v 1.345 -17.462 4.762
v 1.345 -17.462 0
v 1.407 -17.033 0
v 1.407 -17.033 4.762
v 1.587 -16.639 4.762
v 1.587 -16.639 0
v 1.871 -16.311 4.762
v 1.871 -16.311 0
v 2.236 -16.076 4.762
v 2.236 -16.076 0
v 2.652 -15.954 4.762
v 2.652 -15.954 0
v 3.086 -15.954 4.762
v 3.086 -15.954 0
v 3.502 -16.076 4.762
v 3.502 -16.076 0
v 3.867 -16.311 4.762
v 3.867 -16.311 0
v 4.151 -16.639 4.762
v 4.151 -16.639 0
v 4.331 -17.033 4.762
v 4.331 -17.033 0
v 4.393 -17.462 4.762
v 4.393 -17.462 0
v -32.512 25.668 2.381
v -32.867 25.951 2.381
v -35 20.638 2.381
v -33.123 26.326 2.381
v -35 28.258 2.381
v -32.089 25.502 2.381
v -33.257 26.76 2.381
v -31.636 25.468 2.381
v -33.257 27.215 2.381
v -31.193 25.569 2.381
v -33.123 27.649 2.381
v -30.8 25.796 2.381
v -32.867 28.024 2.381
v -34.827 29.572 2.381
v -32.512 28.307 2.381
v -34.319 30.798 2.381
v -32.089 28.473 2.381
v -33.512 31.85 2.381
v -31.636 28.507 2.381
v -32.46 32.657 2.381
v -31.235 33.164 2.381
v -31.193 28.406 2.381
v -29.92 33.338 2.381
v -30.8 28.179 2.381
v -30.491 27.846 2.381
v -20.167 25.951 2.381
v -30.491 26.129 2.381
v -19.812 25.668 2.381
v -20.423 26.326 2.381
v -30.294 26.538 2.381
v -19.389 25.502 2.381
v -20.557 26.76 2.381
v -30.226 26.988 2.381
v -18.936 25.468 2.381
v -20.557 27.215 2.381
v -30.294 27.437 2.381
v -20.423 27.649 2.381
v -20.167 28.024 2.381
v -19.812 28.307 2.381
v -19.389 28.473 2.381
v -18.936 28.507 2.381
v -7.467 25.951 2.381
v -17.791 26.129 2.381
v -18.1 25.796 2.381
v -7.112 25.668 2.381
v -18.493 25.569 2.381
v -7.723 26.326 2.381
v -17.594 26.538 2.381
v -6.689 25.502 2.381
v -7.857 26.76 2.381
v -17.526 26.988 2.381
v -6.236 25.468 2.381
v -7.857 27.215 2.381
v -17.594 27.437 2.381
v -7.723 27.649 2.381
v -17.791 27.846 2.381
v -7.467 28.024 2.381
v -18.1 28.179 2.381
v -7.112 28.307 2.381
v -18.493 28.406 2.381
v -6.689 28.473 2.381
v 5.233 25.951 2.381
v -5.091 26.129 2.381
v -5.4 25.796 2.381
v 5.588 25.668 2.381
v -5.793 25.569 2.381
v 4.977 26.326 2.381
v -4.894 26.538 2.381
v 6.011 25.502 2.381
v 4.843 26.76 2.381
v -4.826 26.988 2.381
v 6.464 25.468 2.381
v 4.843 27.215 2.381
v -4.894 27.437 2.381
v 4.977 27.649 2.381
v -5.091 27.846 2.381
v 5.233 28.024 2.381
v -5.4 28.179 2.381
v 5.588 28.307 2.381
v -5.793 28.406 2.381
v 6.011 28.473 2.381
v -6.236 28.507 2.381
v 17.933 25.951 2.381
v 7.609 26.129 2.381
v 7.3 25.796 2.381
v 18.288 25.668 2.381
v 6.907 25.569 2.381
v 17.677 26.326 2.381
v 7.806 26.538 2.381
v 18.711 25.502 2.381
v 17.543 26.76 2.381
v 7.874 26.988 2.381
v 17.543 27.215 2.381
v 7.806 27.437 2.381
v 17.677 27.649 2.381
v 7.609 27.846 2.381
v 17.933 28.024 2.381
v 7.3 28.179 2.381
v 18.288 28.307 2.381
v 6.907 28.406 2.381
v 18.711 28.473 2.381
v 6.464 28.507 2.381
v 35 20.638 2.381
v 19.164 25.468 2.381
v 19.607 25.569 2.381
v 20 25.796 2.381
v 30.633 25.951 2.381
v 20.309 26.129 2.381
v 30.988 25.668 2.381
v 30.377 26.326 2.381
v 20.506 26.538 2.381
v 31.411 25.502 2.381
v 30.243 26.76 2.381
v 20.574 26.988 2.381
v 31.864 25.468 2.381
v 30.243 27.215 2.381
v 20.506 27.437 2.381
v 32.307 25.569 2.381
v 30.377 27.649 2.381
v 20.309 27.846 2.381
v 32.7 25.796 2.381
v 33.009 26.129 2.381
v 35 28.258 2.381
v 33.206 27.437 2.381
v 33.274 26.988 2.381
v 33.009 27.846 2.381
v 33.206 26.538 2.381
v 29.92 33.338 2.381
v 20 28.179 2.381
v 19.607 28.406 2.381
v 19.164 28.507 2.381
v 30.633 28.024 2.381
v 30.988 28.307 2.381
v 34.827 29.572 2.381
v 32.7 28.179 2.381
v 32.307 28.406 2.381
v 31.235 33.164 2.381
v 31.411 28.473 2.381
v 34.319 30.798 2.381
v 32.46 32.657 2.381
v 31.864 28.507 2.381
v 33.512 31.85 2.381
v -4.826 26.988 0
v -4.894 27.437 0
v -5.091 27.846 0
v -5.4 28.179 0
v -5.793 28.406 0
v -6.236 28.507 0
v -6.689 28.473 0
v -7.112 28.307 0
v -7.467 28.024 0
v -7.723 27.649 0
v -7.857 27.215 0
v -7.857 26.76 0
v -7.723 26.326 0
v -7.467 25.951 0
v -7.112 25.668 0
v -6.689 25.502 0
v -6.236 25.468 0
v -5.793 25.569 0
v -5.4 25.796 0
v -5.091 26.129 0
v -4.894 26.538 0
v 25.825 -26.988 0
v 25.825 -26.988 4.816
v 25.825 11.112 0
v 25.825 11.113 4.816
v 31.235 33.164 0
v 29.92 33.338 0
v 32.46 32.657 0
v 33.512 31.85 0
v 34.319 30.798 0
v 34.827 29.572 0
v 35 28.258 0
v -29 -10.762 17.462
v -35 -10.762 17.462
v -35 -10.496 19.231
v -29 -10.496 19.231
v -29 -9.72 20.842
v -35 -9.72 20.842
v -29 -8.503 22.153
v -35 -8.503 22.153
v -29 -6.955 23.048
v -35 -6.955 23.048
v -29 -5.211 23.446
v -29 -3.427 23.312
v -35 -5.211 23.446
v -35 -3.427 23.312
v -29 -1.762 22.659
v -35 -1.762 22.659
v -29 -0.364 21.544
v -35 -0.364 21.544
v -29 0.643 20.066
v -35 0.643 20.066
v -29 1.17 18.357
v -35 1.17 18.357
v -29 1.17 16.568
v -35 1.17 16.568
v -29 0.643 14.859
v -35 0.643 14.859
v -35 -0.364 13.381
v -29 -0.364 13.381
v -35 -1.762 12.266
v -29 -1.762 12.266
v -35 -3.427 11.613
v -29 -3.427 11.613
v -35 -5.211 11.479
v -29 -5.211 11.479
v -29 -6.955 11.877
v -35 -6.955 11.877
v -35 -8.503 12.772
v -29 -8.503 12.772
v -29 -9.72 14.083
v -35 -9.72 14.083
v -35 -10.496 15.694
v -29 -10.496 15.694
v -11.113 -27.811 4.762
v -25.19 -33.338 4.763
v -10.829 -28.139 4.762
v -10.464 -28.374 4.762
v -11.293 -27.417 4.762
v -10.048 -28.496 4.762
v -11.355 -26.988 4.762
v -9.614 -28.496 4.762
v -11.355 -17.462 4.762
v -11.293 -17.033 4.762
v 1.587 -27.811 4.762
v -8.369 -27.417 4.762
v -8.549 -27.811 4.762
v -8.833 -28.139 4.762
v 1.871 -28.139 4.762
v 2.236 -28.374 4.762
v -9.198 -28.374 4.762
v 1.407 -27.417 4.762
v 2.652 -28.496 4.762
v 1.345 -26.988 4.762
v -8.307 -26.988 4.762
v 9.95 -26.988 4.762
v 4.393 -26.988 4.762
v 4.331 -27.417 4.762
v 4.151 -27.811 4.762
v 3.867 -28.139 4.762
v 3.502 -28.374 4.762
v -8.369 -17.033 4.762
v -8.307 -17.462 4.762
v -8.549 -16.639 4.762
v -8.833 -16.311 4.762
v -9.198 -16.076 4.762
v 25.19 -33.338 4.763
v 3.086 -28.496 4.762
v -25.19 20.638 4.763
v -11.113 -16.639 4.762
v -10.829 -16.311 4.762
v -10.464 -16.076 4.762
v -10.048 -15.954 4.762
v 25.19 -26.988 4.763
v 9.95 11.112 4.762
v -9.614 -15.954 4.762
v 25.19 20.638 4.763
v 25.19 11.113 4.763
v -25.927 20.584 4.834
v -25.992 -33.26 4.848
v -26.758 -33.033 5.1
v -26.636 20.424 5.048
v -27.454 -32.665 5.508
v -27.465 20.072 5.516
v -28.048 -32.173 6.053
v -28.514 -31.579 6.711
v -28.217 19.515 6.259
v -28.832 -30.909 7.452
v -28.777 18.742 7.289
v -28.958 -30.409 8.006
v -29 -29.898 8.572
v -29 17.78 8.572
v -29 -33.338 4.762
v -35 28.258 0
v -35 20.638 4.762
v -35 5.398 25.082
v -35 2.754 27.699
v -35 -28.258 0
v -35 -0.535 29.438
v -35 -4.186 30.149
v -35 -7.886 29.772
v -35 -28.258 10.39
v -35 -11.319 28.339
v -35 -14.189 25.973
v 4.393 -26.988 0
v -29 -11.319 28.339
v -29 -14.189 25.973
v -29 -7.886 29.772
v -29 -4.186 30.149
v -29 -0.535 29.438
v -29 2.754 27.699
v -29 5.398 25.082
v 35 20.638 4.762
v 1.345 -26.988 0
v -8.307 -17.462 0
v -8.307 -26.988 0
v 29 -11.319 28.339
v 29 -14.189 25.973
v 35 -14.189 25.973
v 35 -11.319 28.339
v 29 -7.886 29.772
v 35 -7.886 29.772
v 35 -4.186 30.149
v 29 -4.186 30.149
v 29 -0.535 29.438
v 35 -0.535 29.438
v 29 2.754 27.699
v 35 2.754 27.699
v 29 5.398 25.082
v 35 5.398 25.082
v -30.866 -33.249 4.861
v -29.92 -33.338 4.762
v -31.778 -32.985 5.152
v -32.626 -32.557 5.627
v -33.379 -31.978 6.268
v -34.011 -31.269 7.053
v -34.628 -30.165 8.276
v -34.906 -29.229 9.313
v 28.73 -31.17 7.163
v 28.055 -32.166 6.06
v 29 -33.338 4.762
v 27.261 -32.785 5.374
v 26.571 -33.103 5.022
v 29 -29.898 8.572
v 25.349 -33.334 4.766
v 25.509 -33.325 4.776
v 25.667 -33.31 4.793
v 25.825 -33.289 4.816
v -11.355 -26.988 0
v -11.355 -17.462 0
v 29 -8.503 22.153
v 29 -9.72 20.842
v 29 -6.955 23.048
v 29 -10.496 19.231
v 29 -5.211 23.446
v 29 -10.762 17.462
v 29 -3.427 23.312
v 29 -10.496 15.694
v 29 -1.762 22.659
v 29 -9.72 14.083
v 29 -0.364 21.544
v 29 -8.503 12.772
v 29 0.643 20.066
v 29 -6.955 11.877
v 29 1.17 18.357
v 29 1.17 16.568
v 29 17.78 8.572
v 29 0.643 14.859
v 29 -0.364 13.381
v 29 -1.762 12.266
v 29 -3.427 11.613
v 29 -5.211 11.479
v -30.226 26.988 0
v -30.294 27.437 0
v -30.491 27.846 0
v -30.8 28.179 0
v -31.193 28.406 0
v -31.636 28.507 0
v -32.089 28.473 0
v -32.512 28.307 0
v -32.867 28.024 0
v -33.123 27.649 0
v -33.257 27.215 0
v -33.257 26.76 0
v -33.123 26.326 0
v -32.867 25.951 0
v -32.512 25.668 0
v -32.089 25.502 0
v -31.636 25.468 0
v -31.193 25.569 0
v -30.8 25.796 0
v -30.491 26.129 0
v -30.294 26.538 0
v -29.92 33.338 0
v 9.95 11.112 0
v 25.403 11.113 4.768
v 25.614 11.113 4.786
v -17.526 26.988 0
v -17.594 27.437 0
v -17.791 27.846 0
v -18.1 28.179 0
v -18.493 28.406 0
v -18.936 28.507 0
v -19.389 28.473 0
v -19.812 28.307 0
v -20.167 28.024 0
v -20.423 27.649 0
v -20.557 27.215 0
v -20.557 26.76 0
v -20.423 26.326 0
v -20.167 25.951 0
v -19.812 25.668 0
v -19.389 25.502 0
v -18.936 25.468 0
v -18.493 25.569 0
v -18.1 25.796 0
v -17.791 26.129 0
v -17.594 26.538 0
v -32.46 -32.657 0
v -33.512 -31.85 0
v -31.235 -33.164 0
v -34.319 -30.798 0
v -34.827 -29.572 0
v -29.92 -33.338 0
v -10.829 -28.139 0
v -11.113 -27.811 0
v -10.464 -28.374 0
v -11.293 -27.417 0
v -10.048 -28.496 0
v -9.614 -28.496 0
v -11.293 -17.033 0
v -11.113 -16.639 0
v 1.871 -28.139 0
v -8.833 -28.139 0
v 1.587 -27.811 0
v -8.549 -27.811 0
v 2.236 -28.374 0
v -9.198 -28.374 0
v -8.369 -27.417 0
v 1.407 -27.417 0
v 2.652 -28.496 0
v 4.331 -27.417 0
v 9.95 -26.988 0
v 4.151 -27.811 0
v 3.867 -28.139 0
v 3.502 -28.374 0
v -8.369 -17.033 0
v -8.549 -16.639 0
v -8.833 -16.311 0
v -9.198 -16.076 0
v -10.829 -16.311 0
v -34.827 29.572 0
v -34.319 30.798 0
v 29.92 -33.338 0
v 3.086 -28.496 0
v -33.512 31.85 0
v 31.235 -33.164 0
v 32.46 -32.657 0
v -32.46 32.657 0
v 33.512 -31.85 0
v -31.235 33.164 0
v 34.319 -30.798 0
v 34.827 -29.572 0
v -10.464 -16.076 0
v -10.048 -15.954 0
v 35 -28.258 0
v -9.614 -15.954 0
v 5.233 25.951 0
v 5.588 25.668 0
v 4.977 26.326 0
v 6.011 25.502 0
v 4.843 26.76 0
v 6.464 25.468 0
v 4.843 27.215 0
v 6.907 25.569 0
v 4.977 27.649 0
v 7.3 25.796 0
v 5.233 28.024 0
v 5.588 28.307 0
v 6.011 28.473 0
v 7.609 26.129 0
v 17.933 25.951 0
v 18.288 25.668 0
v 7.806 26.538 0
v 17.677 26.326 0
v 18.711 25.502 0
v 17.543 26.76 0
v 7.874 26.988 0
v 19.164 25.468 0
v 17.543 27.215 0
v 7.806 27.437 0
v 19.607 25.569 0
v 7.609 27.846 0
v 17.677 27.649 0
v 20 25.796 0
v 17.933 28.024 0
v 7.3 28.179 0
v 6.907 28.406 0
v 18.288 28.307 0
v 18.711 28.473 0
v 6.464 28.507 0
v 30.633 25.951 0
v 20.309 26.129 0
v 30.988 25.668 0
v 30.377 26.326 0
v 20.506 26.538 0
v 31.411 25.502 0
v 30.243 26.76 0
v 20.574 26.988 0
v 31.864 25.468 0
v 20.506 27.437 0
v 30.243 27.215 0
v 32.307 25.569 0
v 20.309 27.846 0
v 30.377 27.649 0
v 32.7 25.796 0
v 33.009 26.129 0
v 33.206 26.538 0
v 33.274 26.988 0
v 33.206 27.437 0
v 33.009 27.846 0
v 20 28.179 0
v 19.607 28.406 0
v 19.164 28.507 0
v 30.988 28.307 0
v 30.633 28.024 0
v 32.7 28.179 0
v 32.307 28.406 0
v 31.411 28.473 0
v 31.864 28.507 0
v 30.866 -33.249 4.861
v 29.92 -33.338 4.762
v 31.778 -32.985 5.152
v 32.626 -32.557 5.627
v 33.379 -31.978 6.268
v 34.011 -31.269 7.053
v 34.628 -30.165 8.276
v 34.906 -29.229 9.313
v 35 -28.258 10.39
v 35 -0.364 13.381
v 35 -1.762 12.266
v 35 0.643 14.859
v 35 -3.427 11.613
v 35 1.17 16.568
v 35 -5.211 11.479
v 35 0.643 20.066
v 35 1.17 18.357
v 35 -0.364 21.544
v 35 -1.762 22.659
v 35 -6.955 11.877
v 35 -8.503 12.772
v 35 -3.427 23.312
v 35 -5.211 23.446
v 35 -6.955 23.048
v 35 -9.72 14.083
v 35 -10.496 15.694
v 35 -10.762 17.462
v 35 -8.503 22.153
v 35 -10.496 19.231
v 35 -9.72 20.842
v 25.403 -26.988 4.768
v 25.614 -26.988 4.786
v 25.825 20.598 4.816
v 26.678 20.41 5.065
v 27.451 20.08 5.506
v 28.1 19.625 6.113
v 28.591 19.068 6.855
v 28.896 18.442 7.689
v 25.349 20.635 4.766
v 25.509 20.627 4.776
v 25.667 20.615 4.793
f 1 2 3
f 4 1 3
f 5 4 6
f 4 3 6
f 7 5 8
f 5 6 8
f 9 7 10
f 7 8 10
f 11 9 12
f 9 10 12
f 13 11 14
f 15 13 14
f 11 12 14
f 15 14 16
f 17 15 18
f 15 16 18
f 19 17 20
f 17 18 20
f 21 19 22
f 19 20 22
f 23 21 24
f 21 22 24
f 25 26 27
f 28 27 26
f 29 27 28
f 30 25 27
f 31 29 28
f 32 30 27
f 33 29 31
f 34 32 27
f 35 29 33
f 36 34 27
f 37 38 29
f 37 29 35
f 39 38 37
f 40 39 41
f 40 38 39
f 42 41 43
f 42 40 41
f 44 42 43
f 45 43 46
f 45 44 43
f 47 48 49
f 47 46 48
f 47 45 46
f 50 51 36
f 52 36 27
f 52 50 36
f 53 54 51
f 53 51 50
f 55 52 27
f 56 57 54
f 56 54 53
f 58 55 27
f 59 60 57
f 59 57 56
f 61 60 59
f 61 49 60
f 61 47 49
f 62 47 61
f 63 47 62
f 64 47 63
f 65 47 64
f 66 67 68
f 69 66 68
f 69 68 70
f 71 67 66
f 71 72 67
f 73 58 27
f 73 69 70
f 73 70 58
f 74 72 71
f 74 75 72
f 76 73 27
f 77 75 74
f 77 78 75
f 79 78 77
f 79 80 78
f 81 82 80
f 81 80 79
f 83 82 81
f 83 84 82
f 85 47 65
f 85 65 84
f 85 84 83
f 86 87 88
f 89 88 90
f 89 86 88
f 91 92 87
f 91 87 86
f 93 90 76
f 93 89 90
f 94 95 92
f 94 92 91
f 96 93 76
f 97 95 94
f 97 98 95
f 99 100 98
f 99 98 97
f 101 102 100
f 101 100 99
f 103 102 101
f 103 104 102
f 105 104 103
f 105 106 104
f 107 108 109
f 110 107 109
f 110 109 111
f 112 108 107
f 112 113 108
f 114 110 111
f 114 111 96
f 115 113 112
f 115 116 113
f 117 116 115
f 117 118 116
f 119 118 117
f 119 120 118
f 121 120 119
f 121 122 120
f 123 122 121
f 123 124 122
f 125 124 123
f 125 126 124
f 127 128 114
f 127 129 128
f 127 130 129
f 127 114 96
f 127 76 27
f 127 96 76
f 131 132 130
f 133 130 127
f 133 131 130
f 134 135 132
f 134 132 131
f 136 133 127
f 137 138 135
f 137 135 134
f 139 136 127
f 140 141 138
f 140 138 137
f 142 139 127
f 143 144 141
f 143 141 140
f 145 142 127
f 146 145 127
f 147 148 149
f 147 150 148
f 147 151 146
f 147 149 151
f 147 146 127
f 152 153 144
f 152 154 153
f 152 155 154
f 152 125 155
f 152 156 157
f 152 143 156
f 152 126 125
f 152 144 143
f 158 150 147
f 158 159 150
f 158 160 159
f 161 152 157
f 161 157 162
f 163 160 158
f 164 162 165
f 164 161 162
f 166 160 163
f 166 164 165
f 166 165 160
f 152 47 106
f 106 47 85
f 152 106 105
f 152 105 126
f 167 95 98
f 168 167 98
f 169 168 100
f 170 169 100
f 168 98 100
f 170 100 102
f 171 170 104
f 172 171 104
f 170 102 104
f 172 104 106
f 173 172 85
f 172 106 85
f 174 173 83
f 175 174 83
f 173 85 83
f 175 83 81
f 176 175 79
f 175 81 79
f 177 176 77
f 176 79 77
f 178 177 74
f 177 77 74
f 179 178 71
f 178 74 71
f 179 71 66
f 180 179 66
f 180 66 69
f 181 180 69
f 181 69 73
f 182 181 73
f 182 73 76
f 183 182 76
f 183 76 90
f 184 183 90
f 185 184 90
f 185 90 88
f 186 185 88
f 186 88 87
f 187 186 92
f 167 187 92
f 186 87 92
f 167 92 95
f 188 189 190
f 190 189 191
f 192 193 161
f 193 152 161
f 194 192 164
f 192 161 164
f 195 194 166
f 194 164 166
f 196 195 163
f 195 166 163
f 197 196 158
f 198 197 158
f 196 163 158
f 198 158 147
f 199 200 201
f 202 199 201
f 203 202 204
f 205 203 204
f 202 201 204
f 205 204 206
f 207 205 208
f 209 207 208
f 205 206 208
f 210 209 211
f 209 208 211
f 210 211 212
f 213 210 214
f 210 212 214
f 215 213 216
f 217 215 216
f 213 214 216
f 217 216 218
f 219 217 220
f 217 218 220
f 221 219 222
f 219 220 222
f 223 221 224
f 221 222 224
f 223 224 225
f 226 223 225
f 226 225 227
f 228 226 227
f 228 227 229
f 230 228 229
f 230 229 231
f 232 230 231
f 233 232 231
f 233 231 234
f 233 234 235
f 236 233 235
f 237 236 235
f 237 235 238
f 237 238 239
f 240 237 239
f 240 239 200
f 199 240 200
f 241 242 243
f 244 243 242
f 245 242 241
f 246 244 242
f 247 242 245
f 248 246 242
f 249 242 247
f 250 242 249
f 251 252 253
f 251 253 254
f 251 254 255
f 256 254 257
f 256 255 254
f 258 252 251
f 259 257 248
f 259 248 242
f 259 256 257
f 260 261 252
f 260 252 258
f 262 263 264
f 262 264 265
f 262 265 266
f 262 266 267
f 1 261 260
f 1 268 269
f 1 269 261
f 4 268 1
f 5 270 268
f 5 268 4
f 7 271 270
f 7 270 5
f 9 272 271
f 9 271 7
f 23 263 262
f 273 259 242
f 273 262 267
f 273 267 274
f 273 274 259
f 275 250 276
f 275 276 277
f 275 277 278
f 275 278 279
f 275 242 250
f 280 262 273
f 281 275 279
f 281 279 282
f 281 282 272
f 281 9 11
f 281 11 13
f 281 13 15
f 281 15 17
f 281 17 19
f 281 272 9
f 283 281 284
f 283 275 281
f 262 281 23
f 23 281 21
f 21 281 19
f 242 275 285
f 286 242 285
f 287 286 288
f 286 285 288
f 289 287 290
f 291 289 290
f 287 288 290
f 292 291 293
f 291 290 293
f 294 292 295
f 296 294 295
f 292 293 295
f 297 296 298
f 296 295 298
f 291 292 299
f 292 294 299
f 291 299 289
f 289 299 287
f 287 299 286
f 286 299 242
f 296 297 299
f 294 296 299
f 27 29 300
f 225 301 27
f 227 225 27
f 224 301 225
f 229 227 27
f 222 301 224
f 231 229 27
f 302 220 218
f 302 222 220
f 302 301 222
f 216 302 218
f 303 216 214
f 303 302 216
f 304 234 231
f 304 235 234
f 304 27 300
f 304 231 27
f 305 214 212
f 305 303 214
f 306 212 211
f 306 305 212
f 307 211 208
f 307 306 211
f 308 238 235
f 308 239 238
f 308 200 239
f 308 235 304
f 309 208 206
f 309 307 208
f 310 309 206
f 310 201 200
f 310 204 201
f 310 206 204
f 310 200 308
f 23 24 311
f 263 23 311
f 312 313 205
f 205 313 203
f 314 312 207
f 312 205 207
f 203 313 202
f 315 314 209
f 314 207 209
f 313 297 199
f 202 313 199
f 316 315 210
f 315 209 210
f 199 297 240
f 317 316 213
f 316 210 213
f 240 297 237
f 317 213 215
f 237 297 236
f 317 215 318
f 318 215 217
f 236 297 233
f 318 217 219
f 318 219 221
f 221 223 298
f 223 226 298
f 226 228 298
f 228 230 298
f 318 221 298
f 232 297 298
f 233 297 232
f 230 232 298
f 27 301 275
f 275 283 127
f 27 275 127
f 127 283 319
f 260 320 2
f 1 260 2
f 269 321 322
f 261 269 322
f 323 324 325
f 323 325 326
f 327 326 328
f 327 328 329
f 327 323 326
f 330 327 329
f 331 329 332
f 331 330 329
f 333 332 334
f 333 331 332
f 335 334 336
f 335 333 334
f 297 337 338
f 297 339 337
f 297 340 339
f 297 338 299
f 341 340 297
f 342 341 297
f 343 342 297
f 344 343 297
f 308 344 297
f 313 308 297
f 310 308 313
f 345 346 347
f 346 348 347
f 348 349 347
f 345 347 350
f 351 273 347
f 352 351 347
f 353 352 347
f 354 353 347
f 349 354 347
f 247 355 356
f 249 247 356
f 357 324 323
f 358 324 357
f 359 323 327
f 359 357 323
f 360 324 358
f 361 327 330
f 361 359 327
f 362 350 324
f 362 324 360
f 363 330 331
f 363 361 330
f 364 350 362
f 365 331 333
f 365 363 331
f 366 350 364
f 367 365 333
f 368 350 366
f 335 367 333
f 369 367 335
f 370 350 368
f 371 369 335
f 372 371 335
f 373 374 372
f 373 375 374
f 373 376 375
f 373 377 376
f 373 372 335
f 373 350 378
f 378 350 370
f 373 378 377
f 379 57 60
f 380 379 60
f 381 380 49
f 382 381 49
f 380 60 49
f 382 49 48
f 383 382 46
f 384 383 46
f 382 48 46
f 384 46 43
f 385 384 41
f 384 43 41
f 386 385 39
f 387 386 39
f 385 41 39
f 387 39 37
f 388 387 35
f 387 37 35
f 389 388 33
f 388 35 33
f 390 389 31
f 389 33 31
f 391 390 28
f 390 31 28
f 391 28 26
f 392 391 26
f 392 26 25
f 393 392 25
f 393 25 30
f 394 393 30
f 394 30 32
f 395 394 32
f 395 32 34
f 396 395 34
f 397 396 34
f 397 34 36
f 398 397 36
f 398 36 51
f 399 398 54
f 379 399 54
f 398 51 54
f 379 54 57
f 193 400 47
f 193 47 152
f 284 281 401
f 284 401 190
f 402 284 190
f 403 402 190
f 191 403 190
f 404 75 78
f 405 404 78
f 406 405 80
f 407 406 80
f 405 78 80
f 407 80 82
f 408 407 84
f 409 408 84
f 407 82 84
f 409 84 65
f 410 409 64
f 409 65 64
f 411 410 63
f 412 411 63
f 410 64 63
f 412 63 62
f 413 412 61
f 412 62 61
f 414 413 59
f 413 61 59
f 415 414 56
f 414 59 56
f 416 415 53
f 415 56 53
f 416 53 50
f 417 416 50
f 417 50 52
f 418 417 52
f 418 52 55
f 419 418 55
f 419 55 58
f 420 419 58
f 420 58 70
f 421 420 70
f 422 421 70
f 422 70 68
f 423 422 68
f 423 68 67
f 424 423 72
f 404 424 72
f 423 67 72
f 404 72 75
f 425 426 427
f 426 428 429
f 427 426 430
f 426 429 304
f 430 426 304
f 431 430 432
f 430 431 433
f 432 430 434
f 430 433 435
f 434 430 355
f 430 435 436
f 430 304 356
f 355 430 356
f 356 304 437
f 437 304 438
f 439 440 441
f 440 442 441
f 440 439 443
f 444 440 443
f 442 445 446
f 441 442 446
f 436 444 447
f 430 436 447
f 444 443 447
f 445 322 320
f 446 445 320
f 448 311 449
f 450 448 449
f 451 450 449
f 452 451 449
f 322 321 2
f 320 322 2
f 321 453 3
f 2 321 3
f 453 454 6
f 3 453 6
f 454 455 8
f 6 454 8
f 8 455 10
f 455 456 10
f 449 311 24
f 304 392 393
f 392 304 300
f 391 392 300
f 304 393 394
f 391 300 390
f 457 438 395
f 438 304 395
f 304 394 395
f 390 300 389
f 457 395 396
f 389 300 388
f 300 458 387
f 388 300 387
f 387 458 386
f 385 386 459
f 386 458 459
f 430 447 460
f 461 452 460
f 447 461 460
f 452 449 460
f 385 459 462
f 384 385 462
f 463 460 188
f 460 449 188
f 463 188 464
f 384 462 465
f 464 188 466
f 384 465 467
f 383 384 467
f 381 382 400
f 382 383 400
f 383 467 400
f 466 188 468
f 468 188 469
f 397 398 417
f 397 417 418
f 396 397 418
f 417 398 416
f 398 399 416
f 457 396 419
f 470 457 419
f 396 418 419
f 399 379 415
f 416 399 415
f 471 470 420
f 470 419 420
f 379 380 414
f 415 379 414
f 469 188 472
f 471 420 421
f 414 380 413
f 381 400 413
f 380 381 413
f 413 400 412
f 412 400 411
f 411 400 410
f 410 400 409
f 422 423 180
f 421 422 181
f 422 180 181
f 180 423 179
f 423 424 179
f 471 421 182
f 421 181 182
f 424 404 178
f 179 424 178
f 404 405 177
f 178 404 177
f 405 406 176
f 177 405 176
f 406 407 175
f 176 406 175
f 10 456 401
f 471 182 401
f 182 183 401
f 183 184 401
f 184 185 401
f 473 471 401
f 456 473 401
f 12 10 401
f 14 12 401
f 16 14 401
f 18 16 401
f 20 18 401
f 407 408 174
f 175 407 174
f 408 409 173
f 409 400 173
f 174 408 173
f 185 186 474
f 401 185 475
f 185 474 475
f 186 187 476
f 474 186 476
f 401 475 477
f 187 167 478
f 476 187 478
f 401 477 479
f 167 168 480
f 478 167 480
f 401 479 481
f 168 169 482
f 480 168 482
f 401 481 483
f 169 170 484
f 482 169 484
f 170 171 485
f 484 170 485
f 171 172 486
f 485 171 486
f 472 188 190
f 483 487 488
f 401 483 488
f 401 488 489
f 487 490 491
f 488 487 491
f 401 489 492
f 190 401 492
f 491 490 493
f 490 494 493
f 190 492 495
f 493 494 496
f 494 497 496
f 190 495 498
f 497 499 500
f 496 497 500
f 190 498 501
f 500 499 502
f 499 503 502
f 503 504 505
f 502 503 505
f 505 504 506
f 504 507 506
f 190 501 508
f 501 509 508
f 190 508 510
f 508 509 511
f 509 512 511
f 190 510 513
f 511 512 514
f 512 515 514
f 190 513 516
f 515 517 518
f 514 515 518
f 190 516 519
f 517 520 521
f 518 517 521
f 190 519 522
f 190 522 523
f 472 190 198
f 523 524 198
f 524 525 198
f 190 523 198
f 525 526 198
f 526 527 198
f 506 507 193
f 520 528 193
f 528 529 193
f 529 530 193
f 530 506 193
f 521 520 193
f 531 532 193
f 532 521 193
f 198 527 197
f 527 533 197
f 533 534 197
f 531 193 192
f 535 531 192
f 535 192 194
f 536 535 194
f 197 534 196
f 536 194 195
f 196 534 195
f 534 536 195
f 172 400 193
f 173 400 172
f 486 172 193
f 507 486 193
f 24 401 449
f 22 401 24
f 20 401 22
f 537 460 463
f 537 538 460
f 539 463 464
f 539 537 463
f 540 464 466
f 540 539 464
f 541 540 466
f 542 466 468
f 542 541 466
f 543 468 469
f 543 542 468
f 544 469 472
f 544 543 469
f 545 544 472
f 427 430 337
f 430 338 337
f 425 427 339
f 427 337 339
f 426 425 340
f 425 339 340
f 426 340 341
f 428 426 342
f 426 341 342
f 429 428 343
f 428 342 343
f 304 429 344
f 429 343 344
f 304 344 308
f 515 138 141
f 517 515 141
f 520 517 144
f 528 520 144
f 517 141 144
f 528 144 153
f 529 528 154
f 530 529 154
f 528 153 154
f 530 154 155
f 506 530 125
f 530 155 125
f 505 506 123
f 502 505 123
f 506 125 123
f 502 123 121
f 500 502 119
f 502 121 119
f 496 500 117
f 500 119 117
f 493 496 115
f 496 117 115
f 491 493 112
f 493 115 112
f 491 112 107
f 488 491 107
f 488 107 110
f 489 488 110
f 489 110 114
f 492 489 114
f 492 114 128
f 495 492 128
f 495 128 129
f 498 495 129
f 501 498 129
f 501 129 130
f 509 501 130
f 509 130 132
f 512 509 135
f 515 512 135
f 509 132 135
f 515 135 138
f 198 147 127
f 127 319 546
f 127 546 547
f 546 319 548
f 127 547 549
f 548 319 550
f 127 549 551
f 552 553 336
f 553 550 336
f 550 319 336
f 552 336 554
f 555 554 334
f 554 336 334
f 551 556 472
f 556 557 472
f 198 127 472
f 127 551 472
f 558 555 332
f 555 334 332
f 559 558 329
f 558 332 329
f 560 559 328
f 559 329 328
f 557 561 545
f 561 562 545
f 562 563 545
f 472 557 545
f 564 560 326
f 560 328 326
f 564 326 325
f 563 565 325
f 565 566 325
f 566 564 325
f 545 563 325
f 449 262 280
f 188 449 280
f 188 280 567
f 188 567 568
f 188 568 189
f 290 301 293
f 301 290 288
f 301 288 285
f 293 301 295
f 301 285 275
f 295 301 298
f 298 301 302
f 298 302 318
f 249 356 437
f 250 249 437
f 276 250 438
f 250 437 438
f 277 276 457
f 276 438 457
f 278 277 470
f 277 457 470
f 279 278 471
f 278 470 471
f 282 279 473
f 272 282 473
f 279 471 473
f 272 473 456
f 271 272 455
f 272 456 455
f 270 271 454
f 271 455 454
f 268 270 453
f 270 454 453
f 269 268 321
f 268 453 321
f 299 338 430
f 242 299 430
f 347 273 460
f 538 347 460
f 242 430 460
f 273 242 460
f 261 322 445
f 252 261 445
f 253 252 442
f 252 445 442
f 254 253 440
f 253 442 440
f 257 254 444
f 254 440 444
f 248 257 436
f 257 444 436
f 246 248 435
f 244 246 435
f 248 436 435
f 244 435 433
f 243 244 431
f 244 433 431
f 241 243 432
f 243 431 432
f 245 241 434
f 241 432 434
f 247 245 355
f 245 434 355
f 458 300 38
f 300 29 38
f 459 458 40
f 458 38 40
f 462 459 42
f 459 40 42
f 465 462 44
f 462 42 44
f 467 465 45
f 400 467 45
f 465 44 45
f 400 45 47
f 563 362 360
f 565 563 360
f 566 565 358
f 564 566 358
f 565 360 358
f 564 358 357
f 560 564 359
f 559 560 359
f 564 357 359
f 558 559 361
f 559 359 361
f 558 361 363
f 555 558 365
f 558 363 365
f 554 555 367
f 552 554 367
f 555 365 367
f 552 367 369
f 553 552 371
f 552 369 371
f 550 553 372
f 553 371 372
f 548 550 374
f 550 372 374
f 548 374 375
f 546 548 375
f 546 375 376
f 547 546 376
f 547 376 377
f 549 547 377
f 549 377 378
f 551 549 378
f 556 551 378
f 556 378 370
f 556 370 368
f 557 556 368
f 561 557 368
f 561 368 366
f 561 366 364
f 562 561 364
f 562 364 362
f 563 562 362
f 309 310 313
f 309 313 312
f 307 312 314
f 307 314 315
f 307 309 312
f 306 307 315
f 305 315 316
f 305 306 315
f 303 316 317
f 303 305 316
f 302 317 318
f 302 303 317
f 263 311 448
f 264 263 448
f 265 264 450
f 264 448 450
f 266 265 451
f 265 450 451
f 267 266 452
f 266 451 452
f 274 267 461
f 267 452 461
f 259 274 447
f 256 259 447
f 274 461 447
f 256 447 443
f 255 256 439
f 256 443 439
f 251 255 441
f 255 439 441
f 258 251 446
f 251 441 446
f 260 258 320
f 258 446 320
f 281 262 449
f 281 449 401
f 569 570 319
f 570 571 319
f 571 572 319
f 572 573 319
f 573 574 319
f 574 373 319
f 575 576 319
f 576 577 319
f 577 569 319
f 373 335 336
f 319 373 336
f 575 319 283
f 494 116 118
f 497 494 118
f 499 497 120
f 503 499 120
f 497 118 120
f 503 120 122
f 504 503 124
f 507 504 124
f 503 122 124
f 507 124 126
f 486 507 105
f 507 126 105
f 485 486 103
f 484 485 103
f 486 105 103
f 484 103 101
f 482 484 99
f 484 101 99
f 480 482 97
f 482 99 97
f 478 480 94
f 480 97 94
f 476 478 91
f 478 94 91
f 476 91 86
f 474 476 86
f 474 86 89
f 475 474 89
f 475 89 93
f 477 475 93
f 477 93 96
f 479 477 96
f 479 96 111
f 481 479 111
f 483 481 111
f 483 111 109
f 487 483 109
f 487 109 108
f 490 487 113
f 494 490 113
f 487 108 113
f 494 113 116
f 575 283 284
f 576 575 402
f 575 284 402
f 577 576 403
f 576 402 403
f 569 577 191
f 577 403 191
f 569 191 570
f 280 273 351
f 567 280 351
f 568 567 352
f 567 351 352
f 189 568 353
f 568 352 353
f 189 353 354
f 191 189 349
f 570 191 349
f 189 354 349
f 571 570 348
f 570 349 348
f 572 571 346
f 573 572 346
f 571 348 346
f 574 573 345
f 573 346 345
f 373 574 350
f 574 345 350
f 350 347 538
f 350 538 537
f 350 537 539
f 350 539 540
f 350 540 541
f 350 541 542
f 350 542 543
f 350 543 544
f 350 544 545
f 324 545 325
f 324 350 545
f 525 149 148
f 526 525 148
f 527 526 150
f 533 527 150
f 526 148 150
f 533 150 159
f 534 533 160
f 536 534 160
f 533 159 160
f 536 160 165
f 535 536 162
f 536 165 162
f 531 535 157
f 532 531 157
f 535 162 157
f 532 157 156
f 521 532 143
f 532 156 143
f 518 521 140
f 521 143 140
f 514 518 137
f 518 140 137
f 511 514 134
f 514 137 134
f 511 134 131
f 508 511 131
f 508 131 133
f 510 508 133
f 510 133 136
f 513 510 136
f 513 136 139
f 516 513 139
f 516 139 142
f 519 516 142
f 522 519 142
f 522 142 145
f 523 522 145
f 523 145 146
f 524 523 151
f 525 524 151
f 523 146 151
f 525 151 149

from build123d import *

# Parameters (mm, degrees)
F0_W          = 70
F0_H          = 66.675
F1_DEPTH      = 4.7625
F2_R          = 6
F3_DEPTH      = 70
F4_W          = 58
F4_H          = 53.975
F5_DEPTH      = 25.401
F6_W          = 15.875
F6_H          = 38.1
F7_DEPTH      = 4.7625
F9_DEPTH      = 25.4
F10_W         = 70
F10_H         = 12.7
F11_DEPTH     = 2.38125
F12_R         = 1.524
F13_DEPTH     = 2.38125
F14_R         = 5.08
F15_T4_DEPTH  = 53.975
F15_T10_DEPTH = 53.975
F15_T17_DEPTH = 53.975
F15_T24_DEPTH = 53.975
F15_T31_DEPTH = 53.975
F15_T38_DEPTH = 53.975
F16_R         = 5.08


# Not quite as in the source:
# - a fillet or chamfer that OpenCascade refuses, or shapes differently, is made with other operations: its cross-section is extruded or revolved along the edge and cut away or added
# - a feature of the source that left no trace in its solid (it failed there, or was rolled back) is left out


with BuildPart() as f1:
    # F0 (on Top) → F1 (new body)
    with BuildSketch(Plane.XY):
        Rectangle(F0_W, F0_H)
    extrude(amount=F1_DEPTH)

    # F2 (on face) → F3 (join, through all)
    with BuildSketch(Plane(origin=(-35, 0, 0), x_dir=(0, -1, 0), z_dir=(-1, 0, 0))):
        with BuildLine():
            ThreePointArc((-5.3975, 25.0825), (-7.2857778852, 21.4785926284), (-7.9375, 17.4625))
            Line((-7.9375, 17.4625), (-7.9375, 4.7625))
            Line((-7.9375, 4.7625), (17.4625, 4.7625))
            Line((17.4625, 4.7625), (17.4625, 17.4625))
            ThreePointArc((17.4625, 17.4625), (16.6159891988, 22.0215343072), (14.1893041237, 25.9728092784))
            ThreePointArc((14.1893041237, 25.9728092784), (4.1858227063, 30.1494004607), (-5.3975, 25.0825))
        make_face()
        with Locations((4.7625, 17.4625)):
            Circle(F2_R, mode=Mode.SUBTRACT)
        with BuildLine():
            Line((-7.9375, 4.7625), (-7.9375, 17.4625))
            ThreePointArc((-7.9375, 17.4625), (-7.2857778852, 21.4785926284), (-5.3975, 25.0825))
            Line((-5.3975, 25.0825), (-20.6375, 4.7625))
            Line((-20.6375, 4.7625), (-7.9375, 4.7625))
        make_face()
        with BuildLine():
            Line((17.4625, 17.4625), (17.4625, 4.7625))
            Line((17.4625, 4.7625), (33.3375, 4.7625))
            Line((33.3375, 4.7625), (14.1893041237, 25.9728092784))
            ThreePointArc((14.1893041237, 25.9728092784), (16.6159891988, 22.0215343072), (17.4625, 17.4625))
        make_face()
    extrude(amount=-F3_DEPTH)

    # F4 (on face) → F5 (cut, through all)
    with BuildSketch(Plane.XY.offset(4.7625)):
        with Locations((0, -6.35)):
            Rectangle(F4_W, F4_H)
    extrude(amount=F5_DEPTH, mode=Mode.SUBTRACT)

    # F6 (on face) → F7 (cut, through all)
    with BuildSketch(Plane.XY.offset(4.7625)):
        with Locations((17.8875, -7.9375)):
            Rectangle(F6_W, F6_H)
    extrude(amount=-F7_DEPTH, mode=Mode.SUBTRACT)

    # F8 (on face) → F9 (cut)
    with BuildSketch(Plane(origin=(0, 0, 0), x_dir=(1, 0, 0), z_dir=(0, 0, -1))):
        with BuildLine():
            Line((1.345, 26.9875), (1.345, 17.4625))
            ThreePointArc((1.345, 17.4625), (2.869, 15.9385), (4.393, 17.4625))
            Line((4.393, 17.4625), (4.393, 26.9875))
            ThreePointArc((4.393, 26.9875), (2.869, 28.5115), (1.345, 26.9875))
        make_face()
        with BuildLine():
            Line((-11.355, 26.9875), (-11.355, 17.4625))
            ThreePointArc((-11.355, 17.4625), (-9.831, 15.9385), (-8.307, 17.4625))
            Line((-8.307, 17.4625), (-8.307, 26.9875))
            ThreePointArc((-8.307, 26.9875), (-9.831, 28.5115), (-11.355, 26.9875))
        make_face()
    extrude(amount=-F9_DEPTH, mode=Mode.SUBTRACT)

    # F10 (on face) → F11 (cut)
    with BuildSketch(Plane.XY.offset(4.7625)):
        with Locations((0, 26.9875)):
            Rectangle(F10_W, F10_H)
    extrude(amount=-F11_DEPTH, mode=Mode.SUBTRACT)

    # F12 (on face) → F13 (cut, through all)
    with BuildSketch(Plane.XY.offset(2.38125)):
        with Locations((-31.75, 26.9875)):
            Circle(F12_R)
        with Locations((-19.05, 26.9875)):
            Circle(F12_R)
        with Locations((-6.35, 26.9875)):
            Circle(F12_R)
        with Locations((6.35, 26.9875)):
            Circle(F12_R)
        with Locations((19.05, 26.9875)):
            Circle(F12_R)
        with Locations((31.75, 26.9875)):
            Circle(F12_R)
    extrude(amount=-F13_DEPTH, mode=Mode.SUBTRACT)

    # F14
    f14_edges = [f1.edges().sort_by_distance(p)[0] for p in [
        (-35, 33.3375, 1.190625),
        (35, 33.3375, 1.190625),
    ]]
    fillet(f14_edges, radius=F14_R)

    # F15: fillet of radius 3.81 on 2 edges, made by hand


with BuildPart() as f15_tool2:
    # F15_s3 → F15_t4 (new body)
    with BuildSketch(Plane.XZ.offset(-20.6375)):
        with BuildLine():
            ThreePointArc((-25.19, 4.7625), (-27.8840768363, 5.8784231637), (-29, 8.5725))
            Line((-29, 8.5725), (-29, 4.7625))
            Line((-29, 4.7625), (-25.19, 4.7625))
        make_face()
    extrude(amount=F15_T4_DEPTH)

    split(bisect_by=Plane(origin=(0, -20.7365394835, 18.7204870337), x_dir=(1, 0, 0), z_dir=(0, 0.7422680412, -0.6701030928)), keep=Keep.TOP)

    split(bisect_by=Plane(origin=(0, 15.494, 11.6205), x_dir=(1, 0, 0), z_dir=(0, -0.8, -0.6)), keep=Keep.TOP)


with BuildPart() as f1_1:
    add(f1.part)

    # F15_t1: union F15_tool2
    add(f15_tool2.part)


with BuildPart() as f15_tool8:
    # F15_s9 → F15_t10 (new body)
    with BuildSketch(Plane.XZ.offset(33.3375)):
        with BuildLine():
            ThreePointArc((25.19, 4.7625), (27.8840768363, 5.8784231637), (29, 8.5725))
            Line((29, 8.5725), (29, 4.7625))
            Line((29, 4.7625), (25.19, 4.7625))
        make_face()
    extrude(amount=-F15_T10_DEPTH)

    split(bisect_by=Plane(origin=(0, -20.7365394835, 18.7204870337), x_dir=(1, 0, 0), z_dir=(0, 0.7422680412, -0.6701030928)), keep=Keep.TOP)

    split(bisect_by=Plane.XZ.offset(26.9875), keep=Keep.TOP)

    split(bisect_by=Plane.YZ.offset(25.825), keep=Keep.BOTTOM)


with BuildPart() as f1_2:
    add(f1_1.part)

    # F15_t7: union F15_tool8
    add(f15_tool8.part)


with BuildPart() as f15_tool15:
    # F15_s16 → F15_t17 (new body)
    with BuildSketch(Plane.XZ.offset(33.3375)):
        with BuildLine():
            ThreePointArc((25.19, 4.7625), (27.8840768363, 5.8784231637), (29, 8.5725))
            Line((29, 8.5725), (29, 4.7625))
            Line((29, 4.7625), (25.19, 4.7625))
        make_face()
    extrude(amount=-F15_T17_DEPTH)

    split(bisect_by=Plane(origin=(0, -20.7365394835, 18.7204870337), x_dir=(1, 0, 0), z_dir=(0, 0.7422680412, -0.6701030928)), keep=Keep.TOP)

    split(bisect_by=Plane.XZ.offset(26.9875), keep=Keep.TOP)

    split(bisect_by=Plane.YZ.offset(25.825), keep=Keep.TOP)


with BuildPart() as f1_3:
    add(f1_2.part)

    # F15_t14: union F15_tool15
    add(f15_tool15.part)


with BuildPart() as f15_tool22:
    # F15_s23 → F15_t24 (new body)
    with BuildSketch(Plane.XZ.offset(33.3375)):
        with BuildLine():
            ThreePointArc((25.19, 4.7625), (27.8840768363, 5.8784231637), (29, 8.5725))
            Line((29, 8.5725), (29, 4.7625))
            Line((29, 4.7625), (25.19, 4.7625))
        make_face()
    extrude(amount=-F15_T24_DEPTH)

    split(bisect_by=Plane.XZ.offset(26.9875), keep=Keep.BOTTOM)

    split(bisect_by=Plane.YZ.offset(25.825), keep=Keep.TOP)

    split(bisect_by=Plane.XZ.offset(-11.1125), keep=Keep.TOP)


with BuildPart() as f1_4:
    add(f1_3.part)

    # F15_t21: union F15_tool22
    add(f15_tool22.part)


with BuildPart() as f15_tool29:
    # F15_s30 → F15_t31 (new body)
    with BuildSketch(Plane.XZ.offset(33.3375)):
        with BuildLine():
            ThreePointArc((25.19, 4.7625), (27.8840768363, 5.8784231637), (29, 8.5725))
            Line((29, 8.5725), (29, 4.7625))
            Line((29, 4.7625), (25.19, 4.7625))
        make_face()
    extrude(amount=-F15_T31_DEPTH)

    split(bisect_by=Plane(origin=(0, 15.494, 11.6205), x_dir=(1, 0, 0), z_dir=(0, -0.8, -0.6)), keep=Keep.TOP)

    split(bisect_by=Plane.YZ.offset(25.825), keep=Keep.BOTTOM)

    split(bisect_by=Plane.XZ.offset(-11.1125), keep=Keep.BOTTOM)


with BuildPart() as f1_5:
    add(f1_4.part)

    # F15_t28: union F15_tool29
    add(f15_tool29.part)


with BuildPart() as f15_tool36:
    # F15_s37 → F15_t38 (new body)
    with BuildSketch(Plane.XZ.offset(33.3375)):
        with BuildLine():
            ThreePointArc((25.19, 4.7625), (27.8840768363, 5.8784231637), (29, 8.5725))
            Line((29, 8.5725), (29, 4.7625))
            Line((29, 4.7625), (25.19, 4.7625))
        make_face()
    extrude(amount=-F15_T38_DEPTH)

    split(bisect_by=Plane(origin=(0, 15.494, 11.6205), x_dir=(1, 0, 0), z_dir=(0, -0.8, -0.6)), keep=Keep.TOP)

    split(bisect_by=Plane.YZ.offset(25.825), keep=Keep.TOP)

    split(bisect_by=Plane.XZ.offset(-11.1125), keep=Keep.BOTTOM)


with BuildPart() as f1_6:
    add(f1_5.part)

    # F15_t35: union F15_tool36
    add(f15_tool36.part)

    # F16
    f16_edges = [f1_6.edges().sort_by_distance(p)[0] for p in [
        (35, -33.3375, 2.38125),
        (-35, -33.3375, 2.38125),
    ]]
    fillet(f16_edges, radius=F16_R)


solid = f1_6.part
